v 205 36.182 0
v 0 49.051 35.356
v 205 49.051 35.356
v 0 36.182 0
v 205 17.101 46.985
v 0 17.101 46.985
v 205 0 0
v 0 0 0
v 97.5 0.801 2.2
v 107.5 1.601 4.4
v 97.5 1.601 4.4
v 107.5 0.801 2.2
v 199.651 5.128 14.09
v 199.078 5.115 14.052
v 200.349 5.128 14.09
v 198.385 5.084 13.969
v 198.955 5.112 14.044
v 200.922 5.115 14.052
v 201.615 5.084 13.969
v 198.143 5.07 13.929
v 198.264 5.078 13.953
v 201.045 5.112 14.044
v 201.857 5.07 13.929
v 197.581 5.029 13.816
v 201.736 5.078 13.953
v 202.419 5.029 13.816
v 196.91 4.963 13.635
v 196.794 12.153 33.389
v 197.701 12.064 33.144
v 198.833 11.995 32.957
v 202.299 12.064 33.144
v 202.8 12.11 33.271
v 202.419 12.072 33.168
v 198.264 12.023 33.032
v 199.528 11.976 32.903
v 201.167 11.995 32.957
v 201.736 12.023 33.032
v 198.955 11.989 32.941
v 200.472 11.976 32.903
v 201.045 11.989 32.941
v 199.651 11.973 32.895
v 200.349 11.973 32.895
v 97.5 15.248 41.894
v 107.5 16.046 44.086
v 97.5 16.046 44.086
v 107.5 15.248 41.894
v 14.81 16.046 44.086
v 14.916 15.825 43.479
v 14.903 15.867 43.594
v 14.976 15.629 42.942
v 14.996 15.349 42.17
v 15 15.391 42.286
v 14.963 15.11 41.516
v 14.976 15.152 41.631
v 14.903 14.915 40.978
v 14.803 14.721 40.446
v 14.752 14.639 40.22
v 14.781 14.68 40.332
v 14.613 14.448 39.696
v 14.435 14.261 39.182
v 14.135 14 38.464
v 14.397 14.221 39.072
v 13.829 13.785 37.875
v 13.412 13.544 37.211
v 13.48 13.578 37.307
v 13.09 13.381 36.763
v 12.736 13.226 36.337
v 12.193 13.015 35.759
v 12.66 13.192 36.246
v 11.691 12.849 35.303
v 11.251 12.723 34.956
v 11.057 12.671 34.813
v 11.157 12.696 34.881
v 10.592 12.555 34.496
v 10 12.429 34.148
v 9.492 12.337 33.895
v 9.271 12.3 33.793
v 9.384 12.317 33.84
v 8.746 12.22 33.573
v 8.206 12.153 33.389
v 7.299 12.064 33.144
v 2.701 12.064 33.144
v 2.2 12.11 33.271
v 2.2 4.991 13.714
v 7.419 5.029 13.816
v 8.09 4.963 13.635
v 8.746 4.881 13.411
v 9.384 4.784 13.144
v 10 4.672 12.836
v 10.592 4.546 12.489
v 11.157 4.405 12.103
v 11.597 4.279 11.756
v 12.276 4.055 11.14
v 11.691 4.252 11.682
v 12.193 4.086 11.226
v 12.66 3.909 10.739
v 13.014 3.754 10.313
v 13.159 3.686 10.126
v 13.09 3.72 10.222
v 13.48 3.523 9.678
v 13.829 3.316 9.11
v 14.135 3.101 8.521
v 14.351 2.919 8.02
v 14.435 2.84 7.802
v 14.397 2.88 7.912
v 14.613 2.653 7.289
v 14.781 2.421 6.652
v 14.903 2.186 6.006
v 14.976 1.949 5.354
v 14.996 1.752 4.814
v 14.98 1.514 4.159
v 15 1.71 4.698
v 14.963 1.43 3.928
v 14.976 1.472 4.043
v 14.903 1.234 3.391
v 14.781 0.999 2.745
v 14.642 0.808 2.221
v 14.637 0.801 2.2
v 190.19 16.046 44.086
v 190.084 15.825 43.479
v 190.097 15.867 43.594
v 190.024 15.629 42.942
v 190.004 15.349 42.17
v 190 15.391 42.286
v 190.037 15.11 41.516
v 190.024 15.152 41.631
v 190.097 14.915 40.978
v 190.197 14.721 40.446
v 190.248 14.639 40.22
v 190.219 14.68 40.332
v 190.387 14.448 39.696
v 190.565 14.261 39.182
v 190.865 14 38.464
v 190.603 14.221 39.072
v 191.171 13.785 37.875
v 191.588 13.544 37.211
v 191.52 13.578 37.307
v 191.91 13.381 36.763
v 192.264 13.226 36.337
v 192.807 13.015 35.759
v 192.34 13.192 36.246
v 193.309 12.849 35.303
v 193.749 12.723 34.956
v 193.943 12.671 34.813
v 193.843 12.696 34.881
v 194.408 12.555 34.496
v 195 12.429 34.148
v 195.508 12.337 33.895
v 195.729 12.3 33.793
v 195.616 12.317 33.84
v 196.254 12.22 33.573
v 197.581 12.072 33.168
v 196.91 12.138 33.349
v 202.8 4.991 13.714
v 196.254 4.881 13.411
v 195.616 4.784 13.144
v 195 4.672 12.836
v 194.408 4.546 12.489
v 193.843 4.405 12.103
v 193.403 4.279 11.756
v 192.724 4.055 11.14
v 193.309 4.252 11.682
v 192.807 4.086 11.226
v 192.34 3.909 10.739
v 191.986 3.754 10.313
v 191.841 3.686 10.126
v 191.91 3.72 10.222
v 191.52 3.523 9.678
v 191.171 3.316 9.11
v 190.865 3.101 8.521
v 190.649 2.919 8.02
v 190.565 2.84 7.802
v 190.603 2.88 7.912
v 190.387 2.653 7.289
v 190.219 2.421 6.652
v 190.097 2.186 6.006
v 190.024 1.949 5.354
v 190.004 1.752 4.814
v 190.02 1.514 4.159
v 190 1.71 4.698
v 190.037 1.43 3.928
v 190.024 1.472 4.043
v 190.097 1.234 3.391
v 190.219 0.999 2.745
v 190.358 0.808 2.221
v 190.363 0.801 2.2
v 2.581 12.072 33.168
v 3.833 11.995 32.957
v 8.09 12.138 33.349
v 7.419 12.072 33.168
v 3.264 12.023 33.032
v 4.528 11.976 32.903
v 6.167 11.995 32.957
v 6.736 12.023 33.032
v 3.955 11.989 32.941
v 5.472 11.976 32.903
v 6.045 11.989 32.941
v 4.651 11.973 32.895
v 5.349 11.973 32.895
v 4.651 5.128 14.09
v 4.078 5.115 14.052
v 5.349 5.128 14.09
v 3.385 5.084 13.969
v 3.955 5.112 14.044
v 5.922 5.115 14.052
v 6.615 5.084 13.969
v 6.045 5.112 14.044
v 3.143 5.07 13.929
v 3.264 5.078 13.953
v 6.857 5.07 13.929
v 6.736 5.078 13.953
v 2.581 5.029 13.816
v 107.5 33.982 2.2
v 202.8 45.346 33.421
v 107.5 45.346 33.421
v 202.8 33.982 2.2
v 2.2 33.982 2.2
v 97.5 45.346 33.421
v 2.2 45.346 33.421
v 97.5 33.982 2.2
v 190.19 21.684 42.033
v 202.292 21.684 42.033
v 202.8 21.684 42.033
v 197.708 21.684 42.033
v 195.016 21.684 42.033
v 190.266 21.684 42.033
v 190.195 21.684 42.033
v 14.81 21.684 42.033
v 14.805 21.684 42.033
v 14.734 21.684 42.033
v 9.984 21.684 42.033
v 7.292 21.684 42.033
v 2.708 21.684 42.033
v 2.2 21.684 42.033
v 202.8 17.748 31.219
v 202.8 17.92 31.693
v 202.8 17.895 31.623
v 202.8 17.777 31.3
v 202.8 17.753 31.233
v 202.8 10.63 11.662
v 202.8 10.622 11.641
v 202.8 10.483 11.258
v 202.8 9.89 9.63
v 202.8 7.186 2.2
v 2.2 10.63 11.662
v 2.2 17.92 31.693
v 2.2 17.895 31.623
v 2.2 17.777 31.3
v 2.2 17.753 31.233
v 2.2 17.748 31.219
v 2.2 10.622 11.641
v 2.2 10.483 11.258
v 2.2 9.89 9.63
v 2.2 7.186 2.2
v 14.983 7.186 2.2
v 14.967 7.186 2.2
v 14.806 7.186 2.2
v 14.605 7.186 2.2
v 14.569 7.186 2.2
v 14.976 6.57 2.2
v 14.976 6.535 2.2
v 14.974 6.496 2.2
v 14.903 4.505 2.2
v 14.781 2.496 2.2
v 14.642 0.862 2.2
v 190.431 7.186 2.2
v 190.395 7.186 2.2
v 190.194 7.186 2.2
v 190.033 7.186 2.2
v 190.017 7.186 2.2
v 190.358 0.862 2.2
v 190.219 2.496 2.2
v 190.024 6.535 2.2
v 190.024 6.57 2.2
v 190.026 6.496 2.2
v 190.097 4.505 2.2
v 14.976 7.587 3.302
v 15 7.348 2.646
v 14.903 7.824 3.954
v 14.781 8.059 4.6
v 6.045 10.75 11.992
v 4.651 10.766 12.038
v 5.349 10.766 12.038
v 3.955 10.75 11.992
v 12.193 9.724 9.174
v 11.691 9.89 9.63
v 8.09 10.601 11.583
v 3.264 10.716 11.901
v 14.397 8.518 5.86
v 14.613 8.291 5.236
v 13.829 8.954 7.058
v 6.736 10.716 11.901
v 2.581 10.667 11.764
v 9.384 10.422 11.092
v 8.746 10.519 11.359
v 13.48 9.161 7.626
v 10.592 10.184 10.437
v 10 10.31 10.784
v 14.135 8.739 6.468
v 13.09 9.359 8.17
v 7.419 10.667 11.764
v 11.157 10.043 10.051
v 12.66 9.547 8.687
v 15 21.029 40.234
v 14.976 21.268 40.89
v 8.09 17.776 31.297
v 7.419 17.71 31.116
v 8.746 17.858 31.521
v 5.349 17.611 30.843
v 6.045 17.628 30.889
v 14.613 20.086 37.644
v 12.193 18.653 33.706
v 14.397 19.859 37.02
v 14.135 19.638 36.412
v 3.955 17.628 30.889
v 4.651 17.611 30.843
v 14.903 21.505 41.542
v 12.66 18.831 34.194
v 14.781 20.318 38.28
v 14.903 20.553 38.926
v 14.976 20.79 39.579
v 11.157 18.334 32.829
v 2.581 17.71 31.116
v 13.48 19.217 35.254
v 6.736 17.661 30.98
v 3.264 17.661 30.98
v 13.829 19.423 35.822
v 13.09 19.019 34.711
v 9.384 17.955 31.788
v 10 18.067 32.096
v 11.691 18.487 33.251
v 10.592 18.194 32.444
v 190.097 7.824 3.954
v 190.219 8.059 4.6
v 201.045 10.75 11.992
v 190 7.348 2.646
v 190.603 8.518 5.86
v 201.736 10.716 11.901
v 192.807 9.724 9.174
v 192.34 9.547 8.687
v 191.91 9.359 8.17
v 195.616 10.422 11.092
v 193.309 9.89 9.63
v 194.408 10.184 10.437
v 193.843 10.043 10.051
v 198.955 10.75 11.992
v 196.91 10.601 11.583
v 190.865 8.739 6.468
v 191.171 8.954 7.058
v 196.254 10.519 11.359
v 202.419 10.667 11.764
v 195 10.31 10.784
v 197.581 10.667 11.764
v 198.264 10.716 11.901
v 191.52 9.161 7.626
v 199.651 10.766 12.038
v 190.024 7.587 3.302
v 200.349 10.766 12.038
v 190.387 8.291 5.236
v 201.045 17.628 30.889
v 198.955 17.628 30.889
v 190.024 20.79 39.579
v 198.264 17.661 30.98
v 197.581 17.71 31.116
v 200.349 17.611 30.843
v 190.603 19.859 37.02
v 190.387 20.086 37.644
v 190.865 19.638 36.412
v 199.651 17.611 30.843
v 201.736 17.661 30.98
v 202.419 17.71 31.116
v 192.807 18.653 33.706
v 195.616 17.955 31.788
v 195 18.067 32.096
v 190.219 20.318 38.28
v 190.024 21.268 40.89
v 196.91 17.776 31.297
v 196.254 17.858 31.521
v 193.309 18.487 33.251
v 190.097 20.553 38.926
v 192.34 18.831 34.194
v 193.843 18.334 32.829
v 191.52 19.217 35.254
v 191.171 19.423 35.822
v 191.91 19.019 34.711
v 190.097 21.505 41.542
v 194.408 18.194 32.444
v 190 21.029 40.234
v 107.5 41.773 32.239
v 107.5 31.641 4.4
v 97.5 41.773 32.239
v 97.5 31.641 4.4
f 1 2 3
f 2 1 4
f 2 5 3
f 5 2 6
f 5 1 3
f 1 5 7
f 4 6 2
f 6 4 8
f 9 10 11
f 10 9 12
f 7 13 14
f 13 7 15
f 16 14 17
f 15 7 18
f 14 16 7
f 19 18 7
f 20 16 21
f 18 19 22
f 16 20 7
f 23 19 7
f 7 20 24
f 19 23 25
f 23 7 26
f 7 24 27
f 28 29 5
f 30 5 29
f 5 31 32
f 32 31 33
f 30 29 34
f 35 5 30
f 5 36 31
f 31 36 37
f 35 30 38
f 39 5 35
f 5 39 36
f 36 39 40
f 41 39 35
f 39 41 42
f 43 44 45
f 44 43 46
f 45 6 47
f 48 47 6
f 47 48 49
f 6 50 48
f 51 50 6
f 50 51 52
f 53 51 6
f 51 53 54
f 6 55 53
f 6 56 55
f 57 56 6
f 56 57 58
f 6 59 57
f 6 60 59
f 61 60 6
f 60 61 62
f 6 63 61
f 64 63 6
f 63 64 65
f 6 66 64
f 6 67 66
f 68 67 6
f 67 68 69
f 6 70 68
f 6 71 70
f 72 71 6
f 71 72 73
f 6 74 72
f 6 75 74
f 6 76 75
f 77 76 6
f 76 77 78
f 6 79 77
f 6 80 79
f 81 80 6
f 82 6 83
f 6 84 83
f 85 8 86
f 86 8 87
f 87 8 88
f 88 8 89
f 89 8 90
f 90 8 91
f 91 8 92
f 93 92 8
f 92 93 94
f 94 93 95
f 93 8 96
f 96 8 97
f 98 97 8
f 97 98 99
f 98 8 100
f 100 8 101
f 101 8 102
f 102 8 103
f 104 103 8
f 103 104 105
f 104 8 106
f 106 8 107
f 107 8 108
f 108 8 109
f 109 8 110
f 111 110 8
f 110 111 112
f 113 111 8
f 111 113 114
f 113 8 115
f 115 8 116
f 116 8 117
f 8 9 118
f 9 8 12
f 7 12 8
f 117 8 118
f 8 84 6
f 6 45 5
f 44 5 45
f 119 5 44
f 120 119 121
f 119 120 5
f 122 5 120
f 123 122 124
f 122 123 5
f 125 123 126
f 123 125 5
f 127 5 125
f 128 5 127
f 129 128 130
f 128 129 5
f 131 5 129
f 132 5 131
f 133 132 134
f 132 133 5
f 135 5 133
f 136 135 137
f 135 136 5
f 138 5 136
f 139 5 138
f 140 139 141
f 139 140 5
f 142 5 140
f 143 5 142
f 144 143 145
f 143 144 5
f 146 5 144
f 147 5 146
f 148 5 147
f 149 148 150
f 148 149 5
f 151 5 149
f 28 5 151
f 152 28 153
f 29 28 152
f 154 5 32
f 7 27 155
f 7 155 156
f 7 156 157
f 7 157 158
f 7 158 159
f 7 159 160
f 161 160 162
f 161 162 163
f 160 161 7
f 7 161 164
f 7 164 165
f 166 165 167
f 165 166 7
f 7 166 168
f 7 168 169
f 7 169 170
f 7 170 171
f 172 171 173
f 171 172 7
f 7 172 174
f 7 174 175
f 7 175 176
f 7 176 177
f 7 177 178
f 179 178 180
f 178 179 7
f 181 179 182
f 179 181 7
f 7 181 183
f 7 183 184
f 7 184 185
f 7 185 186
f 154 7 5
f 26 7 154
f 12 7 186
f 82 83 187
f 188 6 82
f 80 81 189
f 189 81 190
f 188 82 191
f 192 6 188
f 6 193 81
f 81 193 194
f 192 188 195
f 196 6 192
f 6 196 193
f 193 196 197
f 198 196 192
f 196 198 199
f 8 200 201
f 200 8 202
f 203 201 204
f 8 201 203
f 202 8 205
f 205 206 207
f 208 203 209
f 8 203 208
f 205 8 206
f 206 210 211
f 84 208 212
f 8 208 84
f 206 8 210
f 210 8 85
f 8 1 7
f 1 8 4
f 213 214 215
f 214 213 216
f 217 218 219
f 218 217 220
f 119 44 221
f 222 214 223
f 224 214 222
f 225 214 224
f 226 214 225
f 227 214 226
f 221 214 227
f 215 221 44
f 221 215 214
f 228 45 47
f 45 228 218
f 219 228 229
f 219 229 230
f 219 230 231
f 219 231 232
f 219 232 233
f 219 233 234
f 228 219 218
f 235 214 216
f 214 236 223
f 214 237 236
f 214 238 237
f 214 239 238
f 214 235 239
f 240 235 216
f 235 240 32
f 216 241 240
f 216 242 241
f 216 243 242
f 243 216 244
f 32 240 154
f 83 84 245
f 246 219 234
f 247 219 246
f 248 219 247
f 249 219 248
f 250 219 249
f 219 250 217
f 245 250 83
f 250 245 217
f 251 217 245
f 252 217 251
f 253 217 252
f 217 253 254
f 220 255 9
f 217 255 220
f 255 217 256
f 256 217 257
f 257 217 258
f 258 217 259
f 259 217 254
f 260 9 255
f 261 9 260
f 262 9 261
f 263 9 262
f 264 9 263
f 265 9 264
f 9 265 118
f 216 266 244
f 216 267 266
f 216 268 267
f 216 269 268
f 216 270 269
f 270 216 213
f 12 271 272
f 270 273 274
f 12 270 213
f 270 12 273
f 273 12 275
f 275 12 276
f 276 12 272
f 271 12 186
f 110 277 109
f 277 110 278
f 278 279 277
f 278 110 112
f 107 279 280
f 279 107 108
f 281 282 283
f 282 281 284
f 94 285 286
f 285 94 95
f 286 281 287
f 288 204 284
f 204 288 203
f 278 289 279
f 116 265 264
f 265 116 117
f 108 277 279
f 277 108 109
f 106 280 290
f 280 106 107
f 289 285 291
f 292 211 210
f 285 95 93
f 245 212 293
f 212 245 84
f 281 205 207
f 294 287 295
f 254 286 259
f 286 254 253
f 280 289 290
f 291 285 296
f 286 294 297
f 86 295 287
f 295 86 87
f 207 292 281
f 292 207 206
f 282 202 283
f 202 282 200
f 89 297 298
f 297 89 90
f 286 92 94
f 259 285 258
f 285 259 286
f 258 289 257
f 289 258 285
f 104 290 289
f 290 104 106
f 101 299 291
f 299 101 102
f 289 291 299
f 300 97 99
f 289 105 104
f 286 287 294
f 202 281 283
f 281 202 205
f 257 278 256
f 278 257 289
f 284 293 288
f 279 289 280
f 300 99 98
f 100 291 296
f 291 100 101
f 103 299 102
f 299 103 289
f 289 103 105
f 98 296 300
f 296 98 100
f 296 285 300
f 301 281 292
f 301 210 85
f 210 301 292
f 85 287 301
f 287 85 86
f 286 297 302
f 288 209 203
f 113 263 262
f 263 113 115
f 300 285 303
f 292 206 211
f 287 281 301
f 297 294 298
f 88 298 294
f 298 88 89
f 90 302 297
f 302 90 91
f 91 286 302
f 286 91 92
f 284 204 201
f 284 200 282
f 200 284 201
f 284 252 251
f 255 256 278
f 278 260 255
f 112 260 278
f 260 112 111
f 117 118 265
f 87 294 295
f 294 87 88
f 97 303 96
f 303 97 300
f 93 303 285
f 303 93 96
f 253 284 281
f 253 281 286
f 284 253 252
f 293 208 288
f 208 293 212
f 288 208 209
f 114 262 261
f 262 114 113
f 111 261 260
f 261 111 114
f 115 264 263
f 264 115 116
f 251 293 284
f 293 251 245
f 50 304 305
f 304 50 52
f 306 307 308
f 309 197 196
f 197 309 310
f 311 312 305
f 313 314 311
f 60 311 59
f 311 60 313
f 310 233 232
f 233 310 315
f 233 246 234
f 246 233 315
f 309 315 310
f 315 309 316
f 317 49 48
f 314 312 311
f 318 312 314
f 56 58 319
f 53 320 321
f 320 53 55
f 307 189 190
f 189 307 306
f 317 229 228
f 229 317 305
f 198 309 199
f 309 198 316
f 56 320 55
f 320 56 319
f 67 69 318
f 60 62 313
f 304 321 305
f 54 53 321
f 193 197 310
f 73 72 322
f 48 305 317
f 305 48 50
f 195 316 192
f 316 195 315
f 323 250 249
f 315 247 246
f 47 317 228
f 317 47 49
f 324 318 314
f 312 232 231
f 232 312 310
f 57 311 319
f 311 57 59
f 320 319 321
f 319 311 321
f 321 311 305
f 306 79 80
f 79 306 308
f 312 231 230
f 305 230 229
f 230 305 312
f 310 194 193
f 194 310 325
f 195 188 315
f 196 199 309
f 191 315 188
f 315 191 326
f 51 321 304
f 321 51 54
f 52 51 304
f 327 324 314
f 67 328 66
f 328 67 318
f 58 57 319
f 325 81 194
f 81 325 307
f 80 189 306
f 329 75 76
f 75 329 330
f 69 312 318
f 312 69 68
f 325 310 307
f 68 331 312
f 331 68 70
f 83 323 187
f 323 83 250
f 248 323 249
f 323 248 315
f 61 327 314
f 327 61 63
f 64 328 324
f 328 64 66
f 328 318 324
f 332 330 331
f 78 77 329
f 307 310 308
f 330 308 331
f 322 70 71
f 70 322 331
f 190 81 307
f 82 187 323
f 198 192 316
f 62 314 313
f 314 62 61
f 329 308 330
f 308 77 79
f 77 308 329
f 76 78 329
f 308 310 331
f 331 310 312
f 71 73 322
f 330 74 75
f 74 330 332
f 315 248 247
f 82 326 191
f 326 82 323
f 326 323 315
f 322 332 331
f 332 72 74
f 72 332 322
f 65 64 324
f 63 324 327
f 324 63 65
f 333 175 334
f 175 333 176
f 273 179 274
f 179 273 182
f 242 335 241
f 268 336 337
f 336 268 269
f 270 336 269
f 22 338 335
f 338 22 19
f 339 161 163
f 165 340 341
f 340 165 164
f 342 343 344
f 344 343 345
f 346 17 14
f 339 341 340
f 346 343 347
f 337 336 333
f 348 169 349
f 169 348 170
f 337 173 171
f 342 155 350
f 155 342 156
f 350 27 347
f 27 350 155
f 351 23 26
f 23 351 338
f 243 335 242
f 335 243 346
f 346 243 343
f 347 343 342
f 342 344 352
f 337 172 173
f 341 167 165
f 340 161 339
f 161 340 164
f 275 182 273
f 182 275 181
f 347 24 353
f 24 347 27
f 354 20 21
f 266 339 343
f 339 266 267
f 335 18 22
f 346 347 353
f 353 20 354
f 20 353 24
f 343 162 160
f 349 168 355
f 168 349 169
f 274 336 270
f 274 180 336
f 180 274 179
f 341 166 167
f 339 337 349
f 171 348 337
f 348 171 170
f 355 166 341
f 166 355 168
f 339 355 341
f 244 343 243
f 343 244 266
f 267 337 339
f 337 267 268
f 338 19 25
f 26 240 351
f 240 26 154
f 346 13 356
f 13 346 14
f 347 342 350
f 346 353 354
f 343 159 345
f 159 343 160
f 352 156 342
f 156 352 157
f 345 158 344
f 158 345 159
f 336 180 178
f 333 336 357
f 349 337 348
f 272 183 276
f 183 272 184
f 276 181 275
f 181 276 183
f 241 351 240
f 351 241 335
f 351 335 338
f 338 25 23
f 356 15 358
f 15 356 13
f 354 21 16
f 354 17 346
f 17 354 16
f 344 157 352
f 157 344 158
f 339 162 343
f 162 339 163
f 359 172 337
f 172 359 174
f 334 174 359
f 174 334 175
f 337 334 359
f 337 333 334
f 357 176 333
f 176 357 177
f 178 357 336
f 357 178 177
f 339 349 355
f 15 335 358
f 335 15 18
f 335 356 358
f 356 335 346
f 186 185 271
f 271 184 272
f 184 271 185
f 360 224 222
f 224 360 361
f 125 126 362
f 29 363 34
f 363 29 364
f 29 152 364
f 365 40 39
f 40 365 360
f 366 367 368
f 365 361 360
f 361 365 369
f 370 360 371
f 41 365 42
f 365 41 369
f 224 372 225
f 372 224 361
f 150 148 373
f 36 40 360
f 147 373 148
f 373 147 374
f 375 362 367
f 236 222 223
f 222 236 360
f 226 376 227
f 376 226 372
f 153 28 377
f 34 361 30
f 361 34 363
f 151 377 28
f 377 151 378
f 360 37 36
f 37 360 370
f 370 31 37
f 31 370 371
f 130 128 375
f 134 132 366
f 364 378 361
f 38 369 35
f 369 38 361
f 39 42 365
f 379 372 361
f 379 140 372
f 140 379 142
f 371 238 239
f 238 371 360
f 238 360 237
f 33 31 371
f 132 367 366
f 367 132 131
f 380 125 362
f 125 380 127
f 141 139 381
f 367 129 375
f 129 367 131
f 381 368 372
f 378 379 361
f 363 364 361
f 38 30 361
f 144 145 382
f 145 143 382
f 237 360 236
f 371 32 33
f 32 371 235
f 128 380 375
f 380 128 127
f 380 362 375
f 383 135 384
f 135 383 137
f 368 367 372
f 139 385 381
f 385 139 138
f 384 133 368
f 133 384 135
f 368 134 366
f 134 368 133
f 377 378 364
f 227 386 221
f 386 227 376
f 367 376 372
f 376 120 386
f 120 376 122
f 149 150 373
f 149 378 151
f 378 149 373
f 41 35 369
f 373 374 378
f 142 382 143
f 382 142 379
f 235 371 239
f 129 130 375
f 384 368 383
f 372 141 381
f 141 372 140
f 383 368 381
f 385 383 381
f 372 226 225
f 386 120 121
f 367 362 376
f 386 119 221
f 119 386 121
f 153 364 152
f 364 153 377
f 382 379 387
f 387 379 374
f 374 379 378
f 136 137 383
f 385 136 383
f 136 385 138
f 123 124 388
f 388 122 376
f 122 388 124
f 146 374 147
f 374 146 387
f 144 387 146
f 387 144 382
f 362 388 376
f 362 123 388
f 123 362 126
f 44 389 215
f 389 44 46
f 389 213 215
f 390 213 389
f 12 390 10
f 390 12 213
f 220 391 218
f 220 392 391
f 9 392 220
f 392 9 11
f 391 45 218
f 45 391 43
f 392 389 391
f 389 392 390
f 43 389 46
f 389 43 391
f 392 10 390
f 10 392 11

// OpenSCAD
$fn = 90;

// Panel dimensions (adjust as needed)
a = 20;
h = 50;
l = 205;
id = 34;
wall = 2.2;

screw_radius = (2.95/2);
hole_offset_w = 7.75 + screw_radius;

hole_offset_top = 5.5 + screw_radius;
hole_offset_bot = 5 + screw_radius;

module enclosure(x,y,z,a=20) {
	difference() {
		// Box
		rotate([-a, 0, 0]) cube([x, y, z]);
		
		// Flatten bottom
		translate([-x/2, -y/2, -z]) cube([x*2, y*2, z]);
	}
}

// Enclosure
union() {
	// Main box shell
	difference() {
		enclosure(l, id, h);
		translate([wall, -wall, wall]) enclosure(l - wall*2, id, h - (wall*2));
	}
	
	// Screw posts
	for (x = [5, l - 5]) {
		for (y = [5, h - 5]) {
			intersection() {
				// Cut any extensions outside of the panel area
				enclosure(l, id, h);
				rotate([90-20, 0, 0]) translate([x, y, -6]) cylinder(h=id, d=20);
			}
		}
	}

	// Middle rib
	difference() {
		intersection() {
			// Cut any extensions outside of the panel area
			enclosure(l, id, h);
			translate([l/2 -5 , 0, 0]) cube([10, 100, h]);
		}
		
		translate([0, -wall, wall*2]) enclosure(l, id-wall, h - wall*4);
	}
}
